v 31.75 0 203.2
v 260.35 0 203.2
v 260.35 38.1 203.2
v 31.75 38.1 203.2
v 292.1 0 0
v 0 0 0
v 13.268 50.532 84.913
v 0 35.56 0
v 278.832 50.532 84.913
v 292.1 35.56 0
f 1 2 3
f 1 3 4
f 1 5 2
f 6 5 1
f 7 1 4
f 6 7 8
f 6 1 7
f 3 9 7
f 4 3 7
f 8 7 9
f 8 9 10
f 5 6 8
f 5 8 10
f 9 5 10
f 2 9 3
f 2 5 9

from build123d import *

# Parameters (mm, degrees)
BOSS_EXTRUDE1_DEPTH = 50.8
CHAMFER1_SIZE       = 12.7
CHAMFER1_SIZE2      = 120.832428569
CHAMFER2_SIZE       = 86.430334931
CHAMFER2_SIZE_2     = 15.24


with BuildPart() as part:
    # Sketch1 → Boss-Extrude1 (new body)
    with BuildSketch(Plane(origin=(0, 0, 0), x_dir=(1, 0, 0), z_dir=(0, 1, 0))):
        Polygon((0, 0), (292.1, 0), (260.35, -203.2), (31.75, -203.2), align=None)
    extrude(amount=BOSS_EXTRUDE1_DEPTH)

    # Chamfer1
    chamfer1_edges = [part.edges().sort_by_distance(p)[0] for p in [
        (146.05, 50.8, 203.2),
    ]]
    chamfer1_side = [part.faces().sort_by_distance(p)[0] for p in [
        (146.05, 25.4, 203.2),
    ]]
    chamfer(chamfer1_edges, length=CHAMFER1_SIZE, length2=CHAMFER1_SIZE2, reference=chamfer1_side[0])

    # Chamfer2
    # the kernel refuses this chamfer: 86.430334931, 15.24 mm, written as the material it takes off along each edge
    with BuildSketch(Plane(origin=(-224.592578506, 50.8, 0), x_dir=(0, 0.006682531656101609, 0.9999776716360547), z_dir=(1, 0, 0))) as chamfer2_piece_1:
        Polygon((CHAMFER2_SIZE * 0.999977671636, CHAMFER2_SIZE * 0.0066825316561), (-CHAMFER2_SIZE_2 * 0.0066825316561, CHAMFER2_SIZE_2 * 0.999977671636), (0, 0), align=None)
    extrude(amount=741.285157012, mode=Mode.SUBTRACT)


solid = part.part
